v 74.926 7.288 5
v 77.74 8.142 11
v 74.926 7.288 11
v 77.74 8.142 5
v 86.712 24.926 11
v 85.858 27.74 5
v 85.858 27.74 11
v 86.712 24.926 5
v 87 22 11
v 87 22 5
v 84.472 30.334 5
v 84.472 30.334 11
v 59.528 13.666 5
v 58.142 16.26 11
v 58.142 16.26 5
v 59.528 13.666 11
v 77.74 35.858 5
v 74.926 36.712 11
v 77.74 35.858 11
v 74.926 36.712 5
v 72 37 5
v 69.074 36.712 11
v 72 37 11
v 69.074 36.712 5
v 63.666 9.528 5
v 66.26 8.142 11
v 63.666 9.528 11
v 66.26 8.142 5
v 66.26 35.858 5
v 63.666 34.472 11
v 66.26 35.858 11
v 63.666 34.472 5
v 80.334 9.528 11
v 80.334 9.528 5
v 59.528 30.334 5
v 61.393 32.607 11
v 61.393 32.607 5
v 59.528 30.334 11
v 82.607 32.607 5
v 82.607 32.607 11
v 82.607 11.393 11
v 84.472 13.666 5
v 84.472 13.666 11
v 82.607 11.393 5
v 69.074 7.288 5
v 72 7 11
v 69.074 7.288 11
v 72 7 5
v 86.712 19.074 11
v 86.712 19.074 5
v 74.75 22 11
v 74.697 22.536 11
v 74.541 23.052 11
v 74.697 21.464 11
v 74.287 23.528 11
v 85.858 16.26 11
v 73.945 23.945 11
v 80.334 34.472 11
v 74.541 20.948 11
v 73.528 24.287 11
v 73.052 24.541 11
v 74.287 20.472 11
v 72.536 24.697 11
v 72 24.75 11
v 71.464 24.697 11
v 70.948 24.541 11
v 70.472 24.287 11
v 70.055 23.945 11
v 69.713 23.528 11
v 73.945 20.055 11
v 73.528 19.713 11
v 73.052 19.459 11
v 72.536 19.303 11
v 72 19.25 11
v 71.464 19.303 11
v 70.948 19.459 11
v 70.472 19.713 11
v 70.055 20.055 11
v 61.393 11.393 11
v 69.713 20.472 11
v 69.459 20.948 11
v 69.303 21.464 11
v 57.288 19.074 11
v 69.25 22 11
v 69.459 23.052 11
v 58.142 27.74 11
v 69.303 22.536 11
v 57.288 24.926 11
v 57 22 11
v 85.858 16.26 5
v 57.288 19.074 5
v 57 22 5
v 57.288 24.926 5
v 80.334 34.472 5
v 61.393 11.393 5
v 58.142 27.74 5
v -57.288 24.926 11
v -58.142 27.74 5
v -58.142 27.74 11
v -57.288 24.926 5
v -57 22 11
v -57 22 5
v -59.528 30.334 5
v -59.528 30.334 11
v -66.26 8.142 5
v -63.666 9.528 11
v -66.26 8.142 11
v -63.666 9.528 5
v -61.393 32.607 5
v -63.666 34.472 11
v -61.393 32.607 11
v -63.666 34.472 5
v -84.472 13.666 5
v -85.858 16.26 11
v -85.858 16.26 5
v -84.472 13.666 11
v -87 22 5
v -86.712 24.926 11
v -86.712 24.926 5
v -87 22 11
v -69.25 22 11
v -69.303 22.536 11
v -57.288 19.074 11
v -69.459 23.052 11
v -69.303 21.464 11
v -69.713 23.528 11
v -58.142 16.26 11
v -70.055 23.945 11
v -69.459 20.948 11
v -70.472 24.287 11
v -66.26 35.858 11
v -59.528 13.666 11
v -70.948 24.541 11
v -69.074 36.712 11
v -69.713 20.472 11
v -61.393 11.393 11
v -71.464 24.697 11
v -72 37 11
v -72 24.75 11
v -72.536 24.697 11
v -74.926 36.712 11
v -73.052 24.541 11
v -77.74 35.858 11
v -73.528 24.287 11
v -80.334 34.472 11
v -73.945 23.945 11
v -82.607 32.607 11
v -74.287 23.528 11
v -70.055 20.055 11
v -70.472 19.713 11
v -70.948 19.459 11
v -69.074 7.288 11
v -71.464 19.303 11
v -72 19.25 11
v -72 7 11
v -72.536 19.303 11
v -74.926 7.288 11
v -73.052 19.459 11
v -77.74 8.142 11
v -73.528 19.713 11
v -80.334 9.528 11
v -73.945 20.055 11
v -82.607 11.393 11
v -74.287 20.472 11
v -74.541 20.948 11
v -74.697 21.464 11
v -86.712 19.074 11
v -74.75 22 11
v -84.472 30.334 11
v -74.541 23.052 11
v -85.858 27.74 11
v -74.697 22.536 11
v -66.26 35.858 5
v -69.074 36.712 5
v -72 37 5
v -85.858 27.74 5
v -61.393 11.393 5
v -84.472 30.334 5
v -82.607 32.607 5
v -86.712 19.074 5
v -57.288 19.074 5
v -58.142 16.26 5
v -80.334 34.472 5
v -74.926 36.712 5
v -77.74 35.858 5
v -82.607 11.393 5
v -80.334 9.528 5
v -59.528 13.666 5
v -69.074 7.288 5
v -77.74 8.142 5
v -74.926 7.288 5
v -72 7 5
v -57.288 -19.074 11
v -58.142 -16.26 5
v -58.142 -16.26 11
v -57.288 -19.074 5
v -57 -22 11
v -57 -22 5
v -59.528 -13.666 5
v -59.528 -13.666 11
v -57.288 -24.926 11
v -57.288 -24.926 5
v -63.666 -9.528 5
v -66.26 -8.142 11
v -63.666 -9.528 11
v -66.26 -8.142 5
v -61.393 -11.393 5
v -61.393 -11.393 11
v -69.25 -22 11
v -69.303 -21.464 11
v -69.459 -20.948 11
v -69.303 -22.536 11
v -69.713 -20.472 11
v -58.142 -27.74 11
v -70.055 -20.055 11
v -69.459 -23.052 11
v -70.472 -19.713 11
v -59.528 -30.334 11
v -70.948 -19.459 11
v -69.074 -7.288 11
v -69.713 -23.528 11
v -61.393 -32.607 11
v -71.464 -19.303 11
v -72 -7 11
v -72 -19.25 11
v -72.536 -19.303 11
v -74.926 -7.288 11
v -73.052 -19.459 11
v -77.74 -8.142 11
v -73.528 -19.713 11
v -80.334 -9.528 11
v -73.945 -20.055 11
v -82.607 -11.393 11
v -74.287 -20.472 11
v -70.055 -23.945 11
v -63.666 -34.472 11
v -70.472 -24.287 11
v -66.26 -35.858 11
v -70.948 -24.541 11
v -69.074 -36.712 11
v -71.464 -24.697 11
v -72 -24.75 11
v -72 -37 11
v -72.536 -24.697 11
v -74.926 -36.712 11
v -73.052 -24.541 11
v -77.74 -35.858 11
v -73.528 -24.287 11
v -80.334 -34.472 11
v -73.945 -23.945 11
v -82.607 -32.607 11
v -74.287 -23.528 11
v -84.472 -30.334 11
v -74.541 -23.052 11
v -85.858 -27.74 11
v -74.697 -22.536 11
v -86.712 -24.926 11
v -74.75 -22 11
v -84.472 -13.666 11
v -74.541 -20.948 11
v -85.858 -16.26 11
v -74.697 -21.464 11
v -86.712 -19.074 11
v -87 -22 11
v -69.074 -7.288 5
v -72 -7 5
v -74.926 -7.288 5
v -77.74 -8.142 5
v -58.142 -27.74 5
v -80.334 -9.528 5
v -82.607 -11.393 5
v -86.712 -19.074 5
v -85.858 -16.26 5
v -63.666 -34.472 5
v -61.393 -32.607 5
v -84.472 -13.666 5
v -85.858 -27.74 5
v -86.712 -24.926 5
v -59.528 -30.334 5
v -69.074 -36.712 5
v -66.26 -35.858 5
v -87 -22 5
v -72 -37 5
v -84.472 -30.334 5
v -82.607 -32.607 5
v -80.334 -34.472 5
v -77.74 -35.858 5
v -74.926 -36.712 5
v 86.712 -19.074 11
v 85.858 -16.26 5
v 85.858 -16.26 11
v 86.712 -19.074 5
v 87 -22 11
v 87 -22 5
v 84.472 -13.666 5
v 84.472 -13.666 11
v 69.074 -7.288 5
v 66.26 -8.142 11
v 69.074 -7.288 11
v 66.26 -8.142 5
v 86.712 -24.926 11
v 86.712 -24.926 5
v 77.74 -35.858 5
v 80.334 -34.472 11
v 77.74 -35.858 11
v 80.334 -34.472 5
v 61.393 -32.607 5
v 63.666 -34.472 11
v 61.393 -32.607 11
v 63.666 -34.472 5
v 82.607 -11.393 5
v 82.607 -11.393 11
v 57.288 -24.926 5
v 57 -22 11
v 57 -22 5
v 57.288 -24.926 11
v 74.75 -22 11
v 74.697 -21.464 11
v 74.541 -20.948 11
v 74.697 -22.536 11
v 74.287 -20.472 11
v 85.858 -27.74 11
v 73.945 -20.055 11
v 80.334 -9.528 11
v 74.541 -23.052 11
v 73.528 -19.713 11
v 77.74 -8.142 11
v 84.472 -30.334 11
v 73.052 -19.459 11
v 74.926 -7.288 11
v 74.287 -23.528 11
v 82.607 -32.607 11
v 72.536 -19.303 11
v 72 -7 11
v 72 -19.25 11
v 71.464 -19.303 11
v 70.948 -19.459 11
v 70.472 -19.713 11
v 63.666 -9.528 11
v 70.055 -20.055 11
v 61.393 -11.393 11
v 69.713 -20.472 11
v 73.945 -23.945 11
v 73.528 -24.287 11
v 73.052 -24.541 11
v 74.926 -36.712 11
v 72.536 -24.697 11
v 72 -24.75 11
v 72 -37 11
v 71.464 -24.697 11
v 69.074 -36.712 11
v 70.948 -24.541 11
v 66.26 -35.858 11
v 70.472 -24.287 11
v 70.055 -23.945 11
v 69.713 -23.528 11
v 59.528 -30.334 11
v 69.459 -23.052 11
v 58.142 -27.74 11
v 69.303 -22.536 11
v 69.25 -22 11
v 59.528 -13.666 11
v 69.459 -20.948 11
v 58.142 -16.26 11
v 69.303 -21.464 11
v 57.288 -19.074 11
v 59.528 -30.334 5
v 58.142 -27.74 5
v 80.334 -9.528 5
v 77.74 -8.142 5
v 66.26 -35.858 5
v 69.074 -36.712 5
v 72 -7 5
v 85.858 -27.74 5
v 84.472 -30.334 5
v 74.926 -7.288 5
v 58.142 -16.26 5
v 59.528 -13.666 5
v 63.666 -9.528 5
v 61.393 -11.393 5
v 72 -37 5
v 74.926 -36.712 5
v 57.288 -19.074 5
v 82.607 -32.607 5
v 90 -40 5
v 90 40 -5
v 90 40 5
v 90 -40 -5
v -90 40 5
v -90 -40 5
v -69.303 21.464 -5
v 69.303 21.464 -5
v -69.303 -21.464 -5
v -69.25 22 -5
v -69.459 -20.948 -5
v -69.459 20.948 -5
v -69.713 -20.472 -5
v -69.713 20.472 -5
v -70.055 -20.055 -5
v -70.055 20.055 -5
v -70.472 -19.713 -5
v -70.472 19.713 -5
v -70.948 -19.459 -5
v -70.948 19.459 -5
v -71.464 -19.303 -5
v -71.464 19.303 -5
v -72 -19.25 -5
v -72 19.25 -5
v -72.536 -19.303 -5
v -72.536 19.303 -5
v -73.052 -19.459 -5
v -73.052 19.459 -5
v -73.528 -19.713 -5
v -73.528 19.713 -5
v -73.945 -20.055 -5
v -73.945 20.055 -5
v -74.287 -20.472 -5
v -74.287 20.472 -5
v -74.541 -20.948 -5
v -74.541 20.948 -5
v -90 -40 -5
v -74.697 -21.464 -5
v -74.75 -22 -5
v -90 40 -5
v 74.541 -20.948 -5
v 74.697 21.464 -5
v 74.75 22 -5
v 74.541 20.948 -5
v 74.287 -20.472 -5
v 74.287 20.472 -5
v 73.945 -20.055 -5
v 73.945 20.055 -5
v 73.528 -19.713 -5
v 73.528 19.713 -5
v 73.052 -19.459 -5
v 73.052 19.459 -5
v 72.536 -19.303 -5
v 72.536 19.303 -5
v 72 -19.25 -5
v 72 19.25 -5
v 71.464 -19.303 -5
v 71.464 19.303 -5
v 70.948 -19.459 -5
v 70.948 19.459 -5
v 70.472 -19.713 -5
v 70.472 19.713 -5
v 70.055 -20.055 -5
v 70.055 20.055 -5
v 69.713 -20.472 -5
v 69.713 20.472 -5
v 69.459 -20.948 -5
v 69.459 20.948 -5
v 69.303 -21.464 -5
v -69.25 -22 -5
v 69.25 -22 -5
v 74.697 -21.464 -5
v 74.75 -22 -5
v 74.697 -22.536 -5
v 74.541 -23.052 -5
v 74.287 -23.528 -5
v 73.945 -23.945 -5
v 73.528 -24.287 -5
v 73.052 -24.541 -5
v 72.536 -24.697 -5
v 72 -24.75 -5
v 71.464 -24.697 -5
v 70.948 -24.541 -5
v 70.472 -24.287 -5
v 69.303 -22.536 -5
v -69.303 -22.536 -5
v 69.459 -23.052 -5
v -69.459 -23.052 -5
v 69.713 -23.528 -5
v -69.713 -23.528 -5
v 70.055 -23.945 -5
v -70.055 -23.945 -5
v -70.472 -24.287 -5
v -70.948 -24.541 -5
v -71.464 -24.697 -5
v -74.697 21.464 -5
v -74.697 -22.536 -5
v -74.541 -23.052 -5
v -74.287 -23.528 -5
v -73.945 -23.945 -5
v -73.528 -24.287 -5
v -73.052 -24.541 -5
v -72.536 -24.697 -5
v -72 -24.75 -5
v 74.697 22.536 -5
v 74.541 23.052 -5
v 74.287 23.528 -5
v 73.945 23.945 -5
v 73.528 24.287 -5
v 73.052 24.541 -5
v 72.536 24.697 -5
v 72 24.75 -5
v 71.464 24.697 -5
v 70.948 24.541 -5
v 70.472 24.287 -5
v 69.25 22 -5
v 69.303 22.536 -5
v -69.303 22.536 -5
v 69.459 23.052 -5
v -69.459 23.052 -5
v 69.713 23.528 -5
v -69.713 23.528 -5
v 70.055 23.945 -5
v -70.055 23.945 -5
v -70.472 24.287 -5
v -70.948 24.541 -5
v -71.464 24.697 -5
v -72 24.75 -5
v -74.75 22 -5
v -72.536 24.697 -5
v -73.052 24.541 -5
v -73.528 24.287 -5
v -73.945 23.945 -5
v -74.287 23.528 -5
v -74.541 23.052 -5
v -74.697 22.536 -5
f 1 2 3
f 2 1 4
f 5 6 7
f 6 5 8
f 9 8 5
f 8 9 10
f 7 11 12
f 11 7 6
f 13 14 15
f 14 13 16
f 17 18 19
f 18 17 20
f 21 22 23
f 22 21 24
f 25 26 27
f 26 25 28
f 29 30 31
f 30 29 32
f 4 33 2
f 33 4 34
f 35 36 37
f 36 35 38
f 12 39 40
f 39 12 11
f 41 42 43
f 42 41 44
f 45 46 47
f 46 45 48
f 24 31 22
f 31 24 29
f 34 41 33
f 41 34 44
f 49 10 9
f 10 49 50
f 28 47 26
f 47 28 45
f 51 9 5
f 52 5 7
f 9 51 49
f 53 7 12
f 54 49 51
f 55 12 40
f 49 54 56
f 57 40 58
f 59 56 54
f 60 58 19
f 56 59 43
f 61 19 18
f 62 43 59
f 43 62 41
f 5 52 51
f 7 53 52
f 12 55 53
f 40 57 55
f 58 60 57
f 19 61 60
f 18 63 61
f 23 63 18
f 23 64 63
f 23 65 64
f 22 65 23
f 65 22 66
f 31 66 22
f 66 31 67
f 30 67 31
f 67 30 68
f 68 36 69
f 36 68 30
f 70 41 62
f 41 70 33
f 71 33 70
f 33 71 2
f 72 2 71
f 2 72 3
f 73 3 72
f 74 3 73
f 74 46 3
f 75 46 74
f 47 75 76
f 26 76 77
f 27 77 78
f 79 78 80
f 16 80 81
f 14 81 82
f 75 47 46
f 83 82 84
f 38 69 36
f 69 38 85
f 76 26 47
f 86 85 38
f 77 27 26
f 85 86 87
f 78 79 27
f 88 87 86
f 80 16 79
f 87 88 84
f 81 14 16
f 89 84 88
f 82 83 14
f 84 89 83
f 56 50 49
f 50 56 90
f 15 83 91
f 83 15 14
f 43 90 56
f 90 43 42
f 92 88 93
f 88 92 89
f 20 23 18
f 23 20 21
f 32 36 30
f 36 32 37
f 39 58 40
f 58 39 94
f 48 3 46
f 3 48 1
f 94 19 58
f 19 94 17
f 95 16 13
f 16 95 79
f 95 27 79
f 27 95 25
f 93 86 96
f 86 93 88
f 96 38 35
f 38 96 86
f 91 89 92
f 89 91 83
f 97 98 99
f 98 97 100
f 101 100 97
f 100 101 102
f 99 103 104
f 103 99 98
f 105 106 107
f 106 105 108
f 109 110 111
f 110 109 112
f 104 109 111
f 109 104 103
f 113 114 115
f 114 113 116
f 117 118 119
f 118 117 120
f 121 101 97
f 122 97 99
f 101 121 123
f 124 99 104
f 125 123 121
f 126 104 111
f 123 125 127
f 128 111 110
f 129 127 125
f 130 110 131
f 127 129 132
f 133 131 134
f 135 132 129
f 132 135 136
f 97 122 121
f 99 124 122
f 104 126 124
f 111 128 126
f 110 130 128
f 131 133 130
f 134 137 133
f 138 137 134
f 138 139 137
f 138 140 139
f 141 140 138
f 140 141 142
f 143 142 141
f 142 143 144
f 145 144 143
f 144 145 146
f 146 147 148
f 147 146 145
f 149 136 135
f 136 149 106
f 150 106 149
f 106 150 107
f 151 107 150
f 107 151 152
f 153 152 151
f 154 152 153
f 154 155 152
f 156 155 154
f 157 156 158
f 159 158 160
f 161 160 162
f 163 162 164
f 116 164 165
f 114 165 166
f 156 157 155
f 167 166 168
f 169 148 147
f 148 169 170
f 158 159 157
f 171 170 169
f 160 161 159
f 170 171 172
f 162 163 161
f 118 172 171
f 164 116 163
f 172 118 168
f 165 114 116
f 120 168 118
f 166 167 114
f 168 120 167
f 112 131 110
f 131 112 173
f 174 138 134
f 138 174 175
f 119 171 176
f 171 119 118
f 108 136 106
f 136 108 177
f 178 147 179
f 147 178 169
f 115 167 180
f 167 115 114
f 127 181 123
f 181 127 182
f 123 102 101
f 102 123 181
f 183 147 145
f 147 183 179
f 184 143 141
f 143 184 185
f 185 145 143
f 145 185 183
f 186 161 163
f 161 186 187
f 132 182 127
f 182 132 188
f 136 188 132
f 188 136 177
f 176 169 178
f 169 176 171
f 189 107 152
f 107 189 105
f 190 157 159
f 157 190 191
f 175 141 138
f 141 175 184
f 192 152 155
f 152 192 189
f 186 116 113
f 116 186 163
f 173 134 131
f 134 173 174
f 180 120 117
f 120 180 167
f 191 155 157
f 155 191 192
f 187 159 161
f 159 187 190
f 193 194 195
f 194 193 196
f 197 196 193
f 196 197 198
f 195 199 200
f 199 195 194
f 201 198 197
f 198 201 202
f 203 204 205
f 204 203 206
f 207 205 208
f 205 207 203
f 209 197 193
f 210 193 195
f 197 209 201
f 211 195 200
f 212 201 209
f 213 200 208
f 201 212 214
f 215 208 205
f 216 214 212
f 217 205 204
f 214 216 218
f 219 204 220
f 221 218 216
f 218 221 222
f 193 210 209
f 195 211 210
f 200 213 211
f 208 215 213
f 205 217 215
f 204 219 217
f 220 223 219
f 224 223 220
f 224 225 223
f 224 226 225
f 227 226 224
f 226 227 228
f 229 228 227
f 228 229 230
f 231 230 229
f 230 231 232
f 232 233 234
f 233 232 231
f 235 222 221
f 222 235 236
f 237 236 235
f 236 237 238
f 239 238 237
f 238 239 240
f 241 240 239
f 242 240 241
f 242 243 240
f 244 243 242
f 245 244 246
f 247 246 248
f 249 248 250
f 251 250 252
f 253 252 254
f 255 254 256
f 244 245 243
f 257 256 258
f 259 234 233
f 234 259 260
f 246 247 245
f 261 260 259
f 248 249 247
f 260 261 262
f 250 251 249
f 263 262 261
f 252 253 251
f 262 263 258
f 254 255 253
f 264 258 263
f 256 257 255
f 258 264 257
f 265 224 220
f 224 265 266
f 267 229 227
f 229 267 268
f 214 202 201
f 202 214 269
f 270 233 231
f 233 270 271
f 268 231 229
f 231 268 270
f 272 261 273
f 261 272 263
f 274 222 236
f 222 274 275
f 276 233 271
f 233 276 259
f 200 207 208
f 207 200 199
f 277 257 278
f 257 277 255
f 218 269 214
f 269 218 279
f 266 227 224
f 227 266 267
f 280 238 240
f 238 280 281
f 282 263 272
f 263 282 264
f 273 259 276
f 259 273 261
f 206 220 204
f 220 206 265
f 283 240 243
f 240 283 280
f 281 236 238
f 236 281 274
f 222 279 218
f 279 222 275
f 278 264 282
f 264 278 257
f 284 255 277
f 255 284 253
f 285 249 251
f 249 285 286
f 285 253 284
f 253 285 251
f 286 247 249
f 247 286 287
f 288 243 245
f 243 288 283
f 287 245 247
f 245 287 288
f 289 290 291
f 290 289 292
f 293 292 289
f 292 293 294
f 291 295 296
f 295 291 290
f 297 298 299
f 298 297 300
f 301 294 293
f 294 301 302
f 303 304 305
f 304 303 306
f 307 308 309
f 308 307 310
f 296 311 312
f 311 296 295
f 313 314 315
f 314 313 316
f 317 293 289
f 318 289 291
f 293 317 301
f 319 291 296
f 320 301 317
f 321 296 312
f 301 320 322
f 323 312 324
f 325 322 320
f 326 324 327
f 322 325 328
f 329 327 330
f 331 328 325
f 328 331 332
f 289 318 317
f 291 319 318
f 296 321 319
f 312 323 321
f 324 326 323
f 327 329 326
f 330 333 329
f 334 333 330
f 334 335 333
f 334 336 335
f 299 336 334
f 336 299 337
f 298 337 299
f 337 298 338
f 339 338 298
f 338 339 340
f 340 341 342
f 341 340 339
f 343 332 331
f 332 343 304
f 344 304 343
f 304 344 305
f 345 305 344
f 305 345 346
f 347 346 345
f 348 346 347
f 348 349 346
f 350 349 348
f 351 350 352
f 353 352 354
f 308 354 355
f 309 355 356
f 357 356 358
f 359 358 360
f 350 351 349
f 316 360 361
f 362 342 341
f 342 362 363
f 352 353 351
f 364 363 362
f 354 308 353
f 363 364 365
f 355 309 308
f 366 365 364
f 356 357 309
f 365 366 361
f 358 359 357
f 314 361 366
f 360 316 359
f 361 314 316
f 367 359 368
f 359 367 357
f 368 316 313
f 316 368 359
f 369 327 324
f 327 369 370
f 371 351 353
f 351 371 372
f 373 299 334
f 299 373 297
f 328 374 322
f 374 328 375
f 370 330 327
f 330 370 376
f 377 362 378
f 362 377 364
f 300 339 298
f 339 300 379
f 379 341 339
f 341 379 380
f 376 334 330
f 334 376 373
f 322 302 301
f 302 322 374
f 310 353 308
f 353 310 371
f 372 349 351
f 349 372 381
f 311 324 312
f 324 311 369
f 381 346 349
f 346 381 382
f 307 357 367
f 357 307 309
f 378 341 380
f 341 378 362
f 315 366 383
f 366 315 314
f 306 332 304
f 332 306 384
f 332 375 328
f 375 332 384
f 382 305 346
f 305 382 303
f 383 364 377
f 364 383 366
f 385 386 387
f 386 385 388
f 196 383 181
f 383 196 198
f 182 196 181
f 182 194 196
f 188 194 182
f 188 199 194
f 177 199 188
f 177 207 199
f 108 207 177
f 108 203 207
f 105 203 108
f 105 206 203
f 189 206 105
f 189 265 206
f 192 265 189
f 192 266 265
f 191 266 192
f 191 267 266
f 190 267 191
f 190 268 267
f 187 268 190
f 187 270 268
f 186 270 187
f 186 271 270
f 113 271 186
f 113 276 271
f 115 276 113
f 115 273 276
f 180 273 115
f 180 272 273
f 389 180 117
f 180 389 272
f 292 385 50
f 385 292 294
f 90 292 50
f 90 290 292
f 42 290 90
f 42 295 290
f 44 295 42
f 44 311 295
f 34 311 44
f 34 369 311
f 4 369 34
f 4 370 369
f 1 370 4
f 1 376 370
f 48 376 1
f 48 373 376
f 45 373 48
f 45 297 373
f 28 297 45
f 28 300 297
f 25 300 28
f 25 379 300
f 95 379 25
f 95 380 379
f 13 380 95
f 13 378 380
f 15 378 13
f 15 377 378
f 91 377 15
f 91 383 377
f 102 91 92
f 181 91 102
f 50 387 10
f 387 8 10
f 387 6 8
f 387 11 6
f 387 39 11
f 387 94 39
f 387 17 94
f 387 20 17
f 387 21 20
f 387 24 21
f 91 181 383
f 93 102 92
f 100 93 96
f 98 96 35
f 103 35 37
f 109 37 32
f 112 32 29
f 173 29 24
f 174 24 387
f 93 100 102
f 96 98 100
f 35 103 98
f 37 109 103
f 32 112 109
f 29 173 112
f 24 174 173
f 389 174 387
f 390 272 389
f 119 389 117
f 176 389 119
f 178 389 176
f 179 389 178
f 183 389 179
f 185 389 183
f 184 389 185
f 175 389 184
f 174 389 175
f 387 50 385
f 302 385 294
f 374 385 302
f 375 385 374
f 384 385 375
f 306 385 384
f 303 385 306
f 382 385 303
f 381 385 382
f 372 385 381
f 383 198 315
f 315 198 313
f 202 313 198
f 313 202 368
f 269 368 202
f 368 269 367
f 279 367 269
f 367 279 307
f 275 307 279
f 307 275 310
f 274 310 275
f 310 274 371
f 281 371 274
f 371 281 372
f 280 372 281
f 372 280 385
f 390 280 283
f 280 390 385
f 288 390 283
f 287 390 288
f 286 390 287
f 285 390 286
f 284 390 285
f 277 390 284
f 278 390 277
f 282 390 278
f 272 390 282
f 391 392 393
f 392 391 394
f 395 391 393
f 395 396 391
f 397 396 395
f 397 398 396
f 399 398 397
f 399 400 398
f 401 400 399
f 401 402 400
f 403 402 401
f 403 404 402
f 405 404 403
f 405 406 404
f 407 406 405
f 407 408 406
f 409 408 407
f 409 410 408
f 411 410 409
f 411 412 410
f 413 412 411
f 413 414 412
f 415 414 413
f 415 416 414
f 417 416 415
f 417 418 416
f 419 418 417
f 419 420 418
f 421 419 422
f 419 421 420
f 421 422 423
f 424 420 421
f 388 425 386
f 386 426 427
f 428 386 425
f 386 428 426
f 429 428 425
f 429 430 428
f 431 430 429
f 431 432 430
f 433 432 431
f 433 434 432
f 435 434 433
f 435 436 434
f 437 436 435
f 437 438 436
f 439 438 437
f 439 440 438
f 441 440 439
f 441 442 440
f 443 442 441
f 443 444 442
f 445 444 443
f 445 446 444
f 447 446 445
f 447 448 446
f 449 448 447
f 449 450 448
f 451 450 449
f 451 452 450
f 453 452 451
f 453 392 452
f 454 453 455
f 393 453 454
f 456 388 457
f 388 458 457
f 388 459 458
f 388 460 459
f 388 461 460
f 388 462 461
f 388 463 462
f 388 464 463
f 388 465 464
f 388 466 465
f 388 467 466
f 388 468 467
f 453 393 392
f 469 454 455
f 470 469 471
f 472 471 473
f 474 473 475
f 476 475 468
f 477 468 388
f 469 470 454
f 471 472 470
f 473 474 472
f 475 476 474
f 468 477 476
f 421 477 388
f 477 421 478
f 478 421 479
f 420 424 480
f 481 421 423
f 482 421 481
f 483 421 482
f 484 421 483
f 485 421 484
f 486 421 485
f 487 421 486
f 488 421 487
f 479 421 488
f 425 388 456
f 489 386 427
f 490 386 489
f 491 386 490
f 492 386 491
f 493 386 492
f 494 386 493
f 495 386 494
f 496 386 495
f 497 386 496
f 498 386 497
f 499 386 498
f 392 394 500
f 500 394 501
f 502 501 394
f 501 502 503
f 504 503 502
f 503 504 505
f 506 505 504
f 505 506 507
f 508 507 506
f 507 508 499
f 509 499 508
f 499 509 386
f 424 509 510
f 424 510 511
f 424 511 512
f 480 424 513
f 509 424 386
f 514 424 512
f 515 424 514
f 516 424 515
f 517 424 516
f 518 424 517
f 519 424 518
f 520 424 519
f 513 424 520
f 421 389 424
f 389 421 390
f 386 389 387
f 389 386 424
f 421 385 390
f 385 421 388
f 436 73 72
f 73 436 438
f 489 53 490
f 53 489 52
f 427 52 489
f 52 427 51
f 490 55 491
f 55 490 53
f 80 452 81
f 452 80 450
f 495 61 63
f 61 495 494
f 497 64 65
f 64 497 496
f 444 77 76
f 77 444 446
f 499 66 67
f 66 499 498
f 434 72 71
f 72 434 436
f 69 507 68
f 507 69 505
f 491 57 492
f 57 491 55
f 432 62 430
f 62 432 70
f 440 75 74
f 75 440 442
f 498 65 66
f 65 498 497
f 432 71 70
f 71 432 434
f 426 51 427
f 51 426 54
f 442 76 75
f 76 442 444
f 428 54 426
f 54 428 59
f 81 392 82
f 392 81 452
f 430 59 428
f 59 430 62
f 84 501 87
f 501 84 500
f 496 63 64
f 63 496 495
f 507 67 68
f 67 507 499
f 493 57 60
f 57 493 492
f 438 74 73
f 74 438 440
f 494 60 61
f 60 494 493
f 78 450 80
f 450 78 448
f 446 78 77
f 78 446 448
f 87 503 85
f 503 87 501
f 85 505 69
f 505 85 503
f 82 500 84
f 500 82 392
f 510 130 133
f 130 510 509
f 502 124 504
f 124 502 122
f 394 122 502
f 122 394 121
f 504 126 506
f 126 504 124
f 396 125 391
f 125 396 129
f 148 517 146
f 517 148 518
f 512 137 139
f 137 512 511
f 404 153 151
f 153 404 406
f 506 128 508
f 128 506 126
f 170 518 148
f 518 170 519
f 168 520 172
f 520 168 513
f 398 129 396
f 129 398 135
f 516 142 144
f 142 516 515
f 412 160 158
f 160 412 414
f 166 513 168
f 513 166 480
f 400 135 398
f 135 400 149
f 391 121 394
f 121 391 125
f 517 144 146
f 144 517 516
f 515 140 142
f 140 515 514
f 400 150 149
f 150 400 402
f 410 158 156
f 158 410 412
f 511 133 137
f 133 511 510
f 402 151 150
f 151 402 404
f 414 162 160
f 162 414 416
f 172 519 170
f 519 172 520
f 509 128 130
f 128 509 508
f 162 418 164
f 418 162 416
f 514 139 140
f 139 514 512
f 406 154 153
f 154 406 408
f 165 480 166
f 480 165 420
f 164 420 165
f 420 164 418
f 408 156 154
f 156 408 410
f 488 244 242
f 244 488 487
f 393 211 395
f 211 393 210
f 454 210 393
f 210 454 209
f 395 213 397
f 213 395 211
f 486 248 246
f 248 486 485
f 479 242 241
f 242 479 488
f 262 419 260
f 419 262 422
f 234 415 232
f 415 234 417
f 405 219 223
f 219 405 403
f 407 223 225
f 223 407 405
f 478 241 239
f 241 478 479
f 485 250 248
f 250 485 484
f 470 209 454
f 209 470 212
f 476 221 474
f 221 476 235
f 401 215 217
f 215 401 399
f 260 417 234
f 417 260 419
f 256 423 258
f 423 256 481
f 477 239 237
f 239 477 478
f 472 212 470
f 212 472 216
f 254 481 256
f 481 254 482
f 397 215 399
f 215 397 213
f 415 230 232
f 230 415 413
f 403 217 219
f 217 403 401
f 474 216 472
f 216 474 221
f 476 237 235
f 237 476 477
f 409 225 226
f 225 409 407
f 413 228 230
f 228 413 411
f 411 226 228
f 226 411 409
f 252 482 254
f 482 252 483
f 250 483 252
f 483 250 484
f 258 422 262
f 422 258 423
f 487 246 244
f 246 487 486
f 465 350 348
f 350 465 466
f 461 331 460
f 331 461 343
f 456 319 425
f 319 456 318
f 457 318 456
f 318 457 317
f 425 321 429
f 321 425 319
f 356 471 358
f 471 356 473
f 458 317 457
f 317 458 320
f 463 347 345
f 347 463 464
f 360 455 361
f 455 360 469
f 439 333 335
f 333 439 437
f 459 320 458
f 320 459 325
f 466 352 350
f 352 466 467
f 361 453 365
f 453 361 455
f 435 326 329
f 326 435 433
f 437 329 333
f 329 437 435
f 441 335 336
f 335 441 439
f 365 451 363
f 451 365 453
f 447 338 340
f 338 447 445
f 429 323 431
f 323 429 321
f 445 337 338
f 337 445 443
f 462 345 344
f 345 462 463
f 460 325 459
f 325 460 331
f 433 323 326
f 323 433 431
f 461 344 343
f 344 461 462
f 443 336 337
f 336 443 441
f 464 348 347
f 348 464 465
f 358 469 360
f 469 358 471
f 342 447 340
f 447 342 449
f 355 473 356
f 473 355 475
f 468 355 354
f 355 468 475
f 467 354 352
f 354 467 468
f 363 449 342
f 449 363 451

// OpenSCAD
$fn = 32;

// ----------------------------------------------------------------------
// Anchor pads 180 x 80 x 16
// four corner bosses with anchor holes
// ----------------------------------------------------------------------

// --- parameters (mm) ---
plate = [180, 80, 10];  // base plate size (x, y, z)
pads = 4;               // boss count, one per corner
edge = 18;              // boss centre offset from the plate edge
boss_d = 30;            // boss diameter
boss_h = 6;             // boss height above the base plate
hole_d = 5.5;           // hole diameter

// --- derived feature positions (mm) ---
height = plate[2] + boss_h;      // = 16   overall height of the part
corner_x = plate[0] / 2 - edge;  // = 72   boss centre X
corner_y = plate[1] / 2 - edge;  // = 22   boss centre Y
feature_centers = [
  [corner_x, corner_y],
  [-corner_x, corner_y],
  [-corner_x, -corner_y],
  [corner_x, -corner_y]
];   // boss centres, anchor holes are drilled there

// base plate, four bosses standing on it, anchor holes all the way through
difference() {
  union() {
    cube(plate, center = true);
    for (centre = feature_centers)
      translate([centre[0], centre[1], plate[2] / 2 - 1])
        cylinder(d = boss_d, h = boss_h + 1);
  }
  for (centre = feature_centers)
    translate([centre[0], centre[1], -height])
      cylinder(d = hole_d, h = 2 * height + 2);  // through boss and plate
}
